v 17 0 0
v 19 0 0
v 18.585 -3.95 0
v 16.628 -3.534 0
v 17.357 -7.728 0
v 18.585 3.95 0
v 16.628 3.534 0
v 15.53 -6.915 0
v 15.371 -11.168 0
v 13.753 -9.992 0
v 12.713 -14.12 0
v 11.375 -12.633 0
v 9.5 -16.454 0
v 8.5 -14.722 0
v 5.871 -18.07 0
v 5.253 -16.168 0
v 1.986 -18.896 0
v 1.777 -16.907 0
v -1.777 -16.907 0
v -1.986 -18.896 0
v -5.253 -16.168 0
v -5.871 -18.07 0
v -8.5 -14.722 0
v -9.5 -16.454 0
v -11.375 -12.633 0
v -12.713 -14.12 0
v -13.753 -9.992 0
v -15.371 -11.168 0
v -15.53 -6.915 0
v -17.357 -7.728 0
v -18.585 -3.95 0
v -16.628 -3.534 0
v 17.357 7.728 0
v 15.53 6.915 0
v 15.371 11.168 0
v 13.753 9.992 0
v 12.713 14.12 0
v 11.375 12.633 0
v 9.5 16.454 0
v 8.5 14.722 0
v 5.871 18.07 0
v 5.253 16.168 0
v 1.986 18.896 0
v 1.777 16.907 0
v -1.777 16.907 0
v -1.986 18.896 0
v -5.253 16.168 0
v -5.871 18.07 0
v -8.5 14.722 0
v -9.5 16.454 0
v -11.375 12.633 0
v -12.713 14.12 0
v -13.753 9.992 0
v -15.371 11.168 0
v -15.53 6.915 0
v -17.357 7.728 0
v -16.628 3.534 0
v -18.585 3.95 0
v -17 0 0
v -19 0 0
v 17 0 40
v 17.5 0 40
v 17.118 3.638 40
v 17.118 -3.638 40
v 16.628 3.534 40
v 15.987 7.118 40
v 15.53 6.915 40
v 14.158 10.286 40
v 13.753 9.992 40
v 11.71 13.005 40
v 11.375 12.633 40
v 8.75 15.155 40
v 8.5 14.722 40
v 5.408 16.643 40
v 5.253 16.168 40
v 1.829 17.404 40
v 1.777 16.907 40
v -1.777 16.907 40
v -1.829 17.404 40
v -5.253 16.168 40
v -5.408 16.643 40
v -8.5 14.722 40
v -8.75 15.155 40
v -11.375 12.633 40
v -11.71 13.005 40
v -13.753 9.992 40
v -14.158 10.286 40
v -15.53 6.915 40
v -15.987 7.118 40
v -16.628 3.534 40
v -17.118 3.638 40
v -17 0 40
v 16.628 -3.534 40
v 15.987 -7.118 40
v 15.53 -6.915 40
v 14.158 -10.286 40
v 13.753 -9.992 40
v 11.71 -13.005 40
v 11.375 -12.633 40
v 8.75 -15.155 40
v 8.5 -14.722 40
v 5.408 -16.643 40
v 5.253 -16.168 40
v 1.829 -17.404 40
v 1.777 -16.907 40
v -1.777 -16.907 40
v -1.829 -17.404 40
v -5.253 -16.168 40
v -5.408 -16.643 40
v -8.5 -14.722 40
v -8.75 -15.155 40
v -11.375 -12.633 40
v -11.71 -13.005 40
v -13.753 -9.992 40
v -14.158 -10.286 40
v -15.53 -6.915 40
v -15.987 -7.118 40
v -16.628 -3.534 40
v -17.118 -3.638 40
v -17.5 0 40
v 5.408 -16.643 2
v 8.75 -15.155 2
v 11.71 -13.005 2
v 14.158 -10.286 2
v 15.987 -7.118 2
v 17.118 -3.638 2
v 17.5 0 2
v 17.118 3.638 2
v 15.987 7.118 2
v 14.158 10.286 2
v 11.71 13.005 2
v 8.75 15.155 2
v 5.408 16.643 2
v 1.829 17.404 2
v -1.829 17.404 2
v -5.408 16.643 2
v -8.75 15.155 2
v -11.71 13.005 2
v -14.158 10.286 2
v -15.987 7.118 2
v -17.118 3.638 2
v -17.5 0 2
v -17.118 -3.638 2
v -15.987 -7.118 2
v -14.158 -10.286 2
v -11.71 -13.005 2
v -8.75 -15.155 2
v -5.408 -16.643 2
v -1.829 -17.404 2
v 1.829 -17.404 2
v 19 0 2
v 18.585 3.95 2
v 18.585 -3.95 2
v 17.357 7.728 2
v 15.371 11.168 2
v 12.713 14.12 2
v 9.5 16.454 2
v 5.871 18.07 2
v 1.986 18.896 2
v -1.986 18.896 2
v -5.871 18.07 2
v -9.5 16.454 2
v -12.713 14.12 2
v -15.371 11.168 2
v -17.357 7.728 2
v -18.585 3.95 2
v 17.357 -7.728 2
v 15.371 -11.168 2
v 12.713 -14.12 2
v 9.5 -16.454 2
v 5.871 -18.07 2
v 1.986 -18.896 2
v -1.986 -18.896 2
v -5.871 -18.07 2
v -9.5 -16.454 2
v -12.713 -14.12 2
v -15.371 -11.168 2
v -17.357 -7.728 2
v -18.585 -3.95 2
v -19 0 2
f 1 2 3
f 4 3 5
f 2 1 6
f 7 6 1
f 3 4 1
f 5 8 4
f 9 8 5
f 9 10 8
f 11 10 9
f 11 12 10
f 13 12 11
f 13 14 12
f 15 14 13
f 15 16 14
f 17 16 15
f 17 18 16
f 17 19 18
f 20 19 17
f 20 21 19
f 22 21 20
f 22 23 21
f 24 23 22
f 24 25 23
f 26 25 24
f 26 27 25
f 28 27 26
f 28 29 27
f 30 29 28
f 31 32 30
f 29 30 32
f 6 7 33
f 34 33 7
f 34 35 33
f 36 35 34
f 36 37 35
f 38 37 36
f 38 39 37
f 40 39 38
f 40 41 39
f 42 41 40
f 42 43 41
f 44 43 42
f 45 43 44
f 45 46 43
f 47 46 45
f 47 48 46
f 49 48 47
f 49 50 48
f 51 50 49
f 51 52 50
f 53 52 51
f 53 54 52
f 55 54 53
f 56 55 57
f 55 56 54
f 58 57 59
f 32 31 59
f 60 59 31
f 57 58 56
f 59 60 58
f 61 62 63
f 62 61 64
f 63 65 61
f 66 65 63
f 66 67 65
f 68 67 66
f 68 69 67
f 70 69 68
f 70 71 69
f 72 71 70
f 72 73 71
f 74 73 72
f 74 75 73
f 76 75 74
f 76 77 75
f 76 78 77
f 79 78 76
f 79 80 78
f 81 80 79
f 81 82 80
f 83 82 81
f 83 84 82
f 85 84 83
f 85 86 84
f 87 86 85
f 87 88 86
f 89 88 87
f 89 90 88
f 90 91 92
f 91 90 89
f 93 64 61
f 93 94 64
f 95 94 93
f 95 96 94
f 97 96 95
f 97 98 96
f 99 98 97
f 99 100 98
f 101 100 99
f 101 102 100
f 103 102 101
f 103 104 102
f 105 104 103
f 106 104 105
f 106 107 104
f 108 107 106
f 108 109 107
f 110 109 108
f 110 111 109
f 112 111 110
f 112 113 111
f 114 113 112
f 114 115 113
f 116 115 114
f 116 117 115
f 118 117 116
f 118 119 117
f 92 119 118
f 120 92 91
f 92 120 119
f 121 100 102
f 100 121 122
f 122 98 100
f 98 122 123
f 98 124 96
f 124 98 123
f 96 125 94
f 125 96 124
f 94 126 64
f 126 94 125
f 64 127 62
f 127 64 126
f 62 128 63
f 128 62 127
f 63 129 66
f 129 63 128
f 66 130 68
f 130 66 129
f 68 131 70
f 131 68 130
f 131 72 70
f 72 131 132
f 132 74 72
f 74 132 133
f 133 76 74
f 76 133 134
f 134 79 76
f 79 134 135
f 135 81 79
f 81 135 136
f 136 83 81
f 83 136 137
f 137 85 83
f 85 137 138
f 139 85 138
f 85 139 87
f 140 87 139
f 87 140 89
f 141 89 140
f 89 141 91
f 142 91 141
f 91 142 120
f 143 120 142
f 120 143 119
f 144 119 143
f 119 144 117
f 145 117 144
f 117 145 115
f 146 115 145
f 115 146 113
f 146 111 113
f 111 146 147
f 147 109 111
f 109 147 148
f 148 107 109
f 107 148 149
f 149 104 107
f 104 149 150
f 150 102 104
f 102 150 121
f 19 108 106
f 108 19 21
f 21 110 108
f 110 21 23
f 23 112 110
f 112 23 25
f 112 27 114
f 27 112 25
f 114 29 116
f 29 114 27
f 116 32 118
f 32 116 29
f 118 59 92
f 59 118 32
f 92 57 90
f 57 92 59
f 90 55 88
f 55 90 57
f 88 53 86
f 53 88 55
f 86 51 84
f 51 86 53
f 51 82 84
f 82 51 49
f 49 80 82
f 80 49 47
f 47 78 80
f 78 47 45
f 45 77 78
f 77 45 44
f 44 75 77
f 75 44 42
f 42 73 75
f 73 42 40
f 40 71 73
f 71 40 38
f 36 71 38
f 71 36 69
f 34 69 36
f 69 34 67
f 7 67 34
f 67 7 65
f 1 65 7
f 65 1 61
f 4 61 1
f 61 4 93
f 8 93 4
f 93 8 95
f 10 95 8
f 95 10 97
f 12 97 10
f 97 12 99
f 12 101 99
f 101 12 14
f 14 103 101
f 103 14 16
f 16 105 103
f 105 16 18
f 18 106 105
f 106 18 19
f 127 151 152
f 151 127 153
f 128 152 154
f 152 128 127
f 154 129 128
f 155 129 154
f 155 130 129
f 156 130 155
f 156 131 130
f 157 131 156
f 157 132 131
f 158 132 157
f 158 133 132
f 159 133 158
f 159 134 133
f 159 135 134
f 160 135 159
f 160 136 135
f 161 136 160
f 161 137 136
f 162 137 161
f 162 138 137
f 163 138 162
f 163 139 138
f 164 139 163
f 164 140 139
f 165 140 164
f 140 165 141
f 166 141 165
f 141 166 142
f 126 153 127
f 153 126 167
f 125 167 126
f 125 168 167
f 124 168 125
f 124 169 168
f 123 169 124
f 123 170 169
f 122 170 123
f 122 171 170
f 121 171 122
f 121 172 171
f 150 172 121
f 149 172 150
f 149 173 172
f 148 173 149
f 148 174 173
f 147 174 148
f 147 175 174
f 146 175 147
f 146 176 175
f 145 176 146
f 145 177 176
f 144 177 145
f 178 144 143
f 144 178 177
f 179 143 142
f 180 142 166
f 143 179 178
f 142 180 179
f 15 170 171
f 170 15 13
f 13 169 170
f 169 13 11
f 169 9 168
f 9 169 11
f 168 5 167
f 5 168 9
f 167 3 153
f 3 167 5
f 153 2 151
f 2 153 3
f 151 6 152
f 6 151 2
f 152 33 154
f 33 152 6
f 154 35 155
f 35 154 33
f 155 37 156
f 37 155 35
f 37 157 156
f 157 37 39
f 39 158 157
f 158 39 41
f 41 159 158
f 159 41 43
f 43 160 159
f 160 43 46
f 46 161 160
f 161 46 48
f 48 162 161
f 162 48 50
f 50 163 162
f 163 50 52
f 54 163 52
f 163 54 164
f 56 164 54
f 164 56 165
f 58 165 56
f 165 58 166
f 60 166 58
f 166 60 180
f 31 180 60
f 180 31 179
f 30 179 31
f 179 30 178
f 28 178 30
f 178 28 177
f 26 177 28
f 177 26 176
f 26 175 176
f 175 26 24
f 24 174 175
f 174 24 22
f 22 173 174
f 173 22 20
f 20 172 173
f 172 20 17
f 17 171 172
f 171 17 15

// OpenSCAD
union(){
   linear_extrude (40)    difference()
{circle(d=35
    );
    circle(d=34);
    
    }
   linear_extrude (2) difference()
{circle(d=38
    );
    circle(d=34);
    
    }
    }
